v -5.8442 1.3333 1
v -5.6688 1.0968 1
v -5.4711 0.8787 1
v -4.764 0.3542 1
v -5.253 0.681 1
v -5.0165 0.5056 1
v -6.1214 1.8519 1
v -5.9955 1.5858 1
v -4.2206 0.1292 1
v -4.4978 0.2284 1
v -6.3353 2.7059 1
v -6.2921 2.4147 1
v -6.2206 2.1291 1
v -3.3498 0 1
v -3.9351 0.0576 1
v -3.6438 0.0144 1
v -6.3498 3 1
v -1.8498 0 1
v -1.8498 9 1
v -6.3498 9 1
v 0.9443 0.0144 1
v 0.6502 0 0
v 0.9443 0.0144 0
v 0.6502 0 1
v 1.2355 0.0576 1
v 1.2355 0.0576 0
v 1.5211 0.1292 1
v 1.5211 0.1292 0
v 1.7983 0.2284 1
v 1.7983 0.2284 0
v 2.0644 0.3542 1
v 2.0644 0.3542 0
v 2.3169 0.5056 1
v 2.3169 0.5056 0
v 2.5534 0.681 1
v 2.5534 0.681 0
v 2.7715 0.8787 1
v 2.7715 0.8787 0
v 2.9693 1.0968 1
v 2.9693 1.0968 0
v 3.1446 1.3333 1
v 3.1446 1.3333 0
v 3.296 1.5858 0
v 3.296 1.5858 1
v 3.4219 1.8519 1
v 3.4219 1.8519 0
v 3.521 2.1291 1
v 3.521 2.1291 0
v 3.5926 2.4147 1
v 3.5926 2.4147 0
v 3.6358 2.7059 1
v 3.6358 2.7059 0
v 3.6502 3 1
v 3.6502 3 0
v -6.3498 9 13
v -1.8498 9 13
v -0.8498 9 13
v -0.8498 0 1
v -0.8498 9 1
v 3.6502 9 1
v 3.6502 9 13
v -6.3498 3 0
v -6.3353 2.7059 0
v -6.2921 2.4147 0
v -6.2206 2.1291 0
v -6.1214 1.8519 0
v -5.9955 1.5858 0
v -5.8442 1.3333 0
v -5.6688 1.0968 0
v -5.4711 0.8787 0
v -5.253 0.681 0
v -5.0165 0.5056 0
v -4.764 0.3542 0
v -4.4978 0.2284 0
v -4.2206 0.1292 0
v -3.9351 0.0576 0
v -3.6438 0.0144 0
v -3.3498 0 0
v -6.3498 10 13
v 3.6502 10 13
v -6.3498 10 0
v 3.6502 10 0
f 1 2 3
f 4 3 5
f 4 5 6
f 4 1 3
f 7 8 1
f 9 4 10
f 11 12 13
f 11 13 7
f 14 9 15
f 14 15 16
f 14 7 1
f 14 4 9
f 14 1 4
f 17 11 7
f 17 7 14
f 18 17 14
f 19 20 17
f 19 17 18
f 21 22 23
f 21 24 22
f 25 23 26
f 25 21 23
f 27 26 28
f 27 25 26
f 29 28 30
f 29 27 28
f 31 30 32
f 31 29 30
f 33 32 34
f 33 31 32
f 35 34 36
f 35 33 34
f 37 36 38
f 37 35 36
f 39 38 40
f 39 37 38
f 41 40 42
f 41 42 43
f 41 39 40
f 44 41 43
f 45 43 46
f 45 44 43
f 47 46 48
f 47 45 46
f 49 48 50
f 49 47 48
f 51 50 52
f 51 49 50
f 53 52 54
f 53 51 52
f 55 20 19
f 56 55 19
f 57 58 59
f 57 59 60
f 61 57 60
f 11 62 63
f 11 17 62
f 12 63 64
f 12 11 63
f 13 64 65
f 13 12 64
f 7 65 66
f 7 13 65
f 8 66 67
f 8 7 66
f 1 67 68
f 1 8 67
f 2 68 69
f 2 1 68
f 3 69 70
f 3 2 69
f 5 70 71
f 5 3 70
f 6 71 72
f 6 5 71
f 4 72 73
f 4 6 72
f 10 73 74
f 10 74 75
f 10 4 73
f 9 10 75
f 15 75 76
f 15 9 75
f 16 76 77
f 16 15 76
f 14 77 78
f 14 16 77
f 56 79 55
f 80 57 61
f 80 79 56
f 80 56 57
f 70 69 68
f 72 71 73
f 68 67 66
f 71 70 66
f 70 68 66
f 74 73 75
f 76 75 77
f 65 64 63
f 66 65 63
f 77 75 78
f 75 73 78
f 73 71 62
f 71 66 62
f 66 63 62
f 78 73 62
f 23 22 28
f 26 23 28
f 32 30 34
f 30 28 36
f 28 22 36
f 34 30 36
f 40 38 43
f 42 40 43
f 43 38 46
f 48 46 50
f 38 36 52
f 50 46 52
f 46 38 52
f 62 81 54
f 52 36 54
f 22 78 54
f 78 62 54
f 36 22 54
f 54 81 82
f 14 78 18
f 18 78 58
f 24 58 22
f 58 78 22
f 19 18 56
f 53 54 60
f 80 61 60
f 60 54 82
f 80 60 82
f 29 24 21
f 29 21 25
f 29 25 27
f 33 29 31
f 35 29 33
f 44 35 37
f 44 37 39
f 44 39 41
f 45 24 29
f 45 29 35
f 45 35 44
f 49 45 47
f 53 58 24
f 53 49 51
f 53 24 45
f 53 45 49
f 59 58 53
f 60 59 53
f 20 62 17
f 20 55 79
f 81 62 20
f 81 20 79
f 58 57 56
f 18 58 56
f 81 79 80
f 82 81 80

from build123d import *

# Parameters (mm, degrees)
F1_W     = 10
F1_H     = 10
F2_DEPTH = 1
F3_W     = 10
F3_H     = 1
F4_DEPTH = 12
F8_W     = 1
F8_H     = 15
F10_R    = 3


with BuildPart() as f2:
    # F1 (on Top) → F2 (new body)
    with BuildSketch(Plane.XY):
        with Locations((-1.3497796124, 5)):
            Rectangle(F1_W, F1_H)
    extrude(amount=F2_DEPTH)

    # F3 (on face) → F4 (join)
    with BuildSketch(Plane.XY.offset(1)):
        with Locations((-1.3497796124, 9.5)):
            Rectangle(F3_W, F3_H)
    extrude(amount=F4_DEPTH)

    # F8 (on 3pt) → F9 (join, up to the next surface of F2)
    with BuildSketch(Plane(origin=(0, -0.48, 0.36), x_dir=(-1, 0, 0), z_dir=(0, 0.8, -0.6))):
        with Locations((1.3497796124, 8.3)):
            Rectangle(F8_W, F8_H)
    extrude(until=Until.NEXT)

    # F10
    f10_edges = [f2.edges().sort_by_distance(p)[0] for p in [
        (3.65022, 0, 0.5),
        (-6.34978, 0, 0.5),
    ]]
    fillet(f10_edges, radius=F10_R)


solid = f2.part
